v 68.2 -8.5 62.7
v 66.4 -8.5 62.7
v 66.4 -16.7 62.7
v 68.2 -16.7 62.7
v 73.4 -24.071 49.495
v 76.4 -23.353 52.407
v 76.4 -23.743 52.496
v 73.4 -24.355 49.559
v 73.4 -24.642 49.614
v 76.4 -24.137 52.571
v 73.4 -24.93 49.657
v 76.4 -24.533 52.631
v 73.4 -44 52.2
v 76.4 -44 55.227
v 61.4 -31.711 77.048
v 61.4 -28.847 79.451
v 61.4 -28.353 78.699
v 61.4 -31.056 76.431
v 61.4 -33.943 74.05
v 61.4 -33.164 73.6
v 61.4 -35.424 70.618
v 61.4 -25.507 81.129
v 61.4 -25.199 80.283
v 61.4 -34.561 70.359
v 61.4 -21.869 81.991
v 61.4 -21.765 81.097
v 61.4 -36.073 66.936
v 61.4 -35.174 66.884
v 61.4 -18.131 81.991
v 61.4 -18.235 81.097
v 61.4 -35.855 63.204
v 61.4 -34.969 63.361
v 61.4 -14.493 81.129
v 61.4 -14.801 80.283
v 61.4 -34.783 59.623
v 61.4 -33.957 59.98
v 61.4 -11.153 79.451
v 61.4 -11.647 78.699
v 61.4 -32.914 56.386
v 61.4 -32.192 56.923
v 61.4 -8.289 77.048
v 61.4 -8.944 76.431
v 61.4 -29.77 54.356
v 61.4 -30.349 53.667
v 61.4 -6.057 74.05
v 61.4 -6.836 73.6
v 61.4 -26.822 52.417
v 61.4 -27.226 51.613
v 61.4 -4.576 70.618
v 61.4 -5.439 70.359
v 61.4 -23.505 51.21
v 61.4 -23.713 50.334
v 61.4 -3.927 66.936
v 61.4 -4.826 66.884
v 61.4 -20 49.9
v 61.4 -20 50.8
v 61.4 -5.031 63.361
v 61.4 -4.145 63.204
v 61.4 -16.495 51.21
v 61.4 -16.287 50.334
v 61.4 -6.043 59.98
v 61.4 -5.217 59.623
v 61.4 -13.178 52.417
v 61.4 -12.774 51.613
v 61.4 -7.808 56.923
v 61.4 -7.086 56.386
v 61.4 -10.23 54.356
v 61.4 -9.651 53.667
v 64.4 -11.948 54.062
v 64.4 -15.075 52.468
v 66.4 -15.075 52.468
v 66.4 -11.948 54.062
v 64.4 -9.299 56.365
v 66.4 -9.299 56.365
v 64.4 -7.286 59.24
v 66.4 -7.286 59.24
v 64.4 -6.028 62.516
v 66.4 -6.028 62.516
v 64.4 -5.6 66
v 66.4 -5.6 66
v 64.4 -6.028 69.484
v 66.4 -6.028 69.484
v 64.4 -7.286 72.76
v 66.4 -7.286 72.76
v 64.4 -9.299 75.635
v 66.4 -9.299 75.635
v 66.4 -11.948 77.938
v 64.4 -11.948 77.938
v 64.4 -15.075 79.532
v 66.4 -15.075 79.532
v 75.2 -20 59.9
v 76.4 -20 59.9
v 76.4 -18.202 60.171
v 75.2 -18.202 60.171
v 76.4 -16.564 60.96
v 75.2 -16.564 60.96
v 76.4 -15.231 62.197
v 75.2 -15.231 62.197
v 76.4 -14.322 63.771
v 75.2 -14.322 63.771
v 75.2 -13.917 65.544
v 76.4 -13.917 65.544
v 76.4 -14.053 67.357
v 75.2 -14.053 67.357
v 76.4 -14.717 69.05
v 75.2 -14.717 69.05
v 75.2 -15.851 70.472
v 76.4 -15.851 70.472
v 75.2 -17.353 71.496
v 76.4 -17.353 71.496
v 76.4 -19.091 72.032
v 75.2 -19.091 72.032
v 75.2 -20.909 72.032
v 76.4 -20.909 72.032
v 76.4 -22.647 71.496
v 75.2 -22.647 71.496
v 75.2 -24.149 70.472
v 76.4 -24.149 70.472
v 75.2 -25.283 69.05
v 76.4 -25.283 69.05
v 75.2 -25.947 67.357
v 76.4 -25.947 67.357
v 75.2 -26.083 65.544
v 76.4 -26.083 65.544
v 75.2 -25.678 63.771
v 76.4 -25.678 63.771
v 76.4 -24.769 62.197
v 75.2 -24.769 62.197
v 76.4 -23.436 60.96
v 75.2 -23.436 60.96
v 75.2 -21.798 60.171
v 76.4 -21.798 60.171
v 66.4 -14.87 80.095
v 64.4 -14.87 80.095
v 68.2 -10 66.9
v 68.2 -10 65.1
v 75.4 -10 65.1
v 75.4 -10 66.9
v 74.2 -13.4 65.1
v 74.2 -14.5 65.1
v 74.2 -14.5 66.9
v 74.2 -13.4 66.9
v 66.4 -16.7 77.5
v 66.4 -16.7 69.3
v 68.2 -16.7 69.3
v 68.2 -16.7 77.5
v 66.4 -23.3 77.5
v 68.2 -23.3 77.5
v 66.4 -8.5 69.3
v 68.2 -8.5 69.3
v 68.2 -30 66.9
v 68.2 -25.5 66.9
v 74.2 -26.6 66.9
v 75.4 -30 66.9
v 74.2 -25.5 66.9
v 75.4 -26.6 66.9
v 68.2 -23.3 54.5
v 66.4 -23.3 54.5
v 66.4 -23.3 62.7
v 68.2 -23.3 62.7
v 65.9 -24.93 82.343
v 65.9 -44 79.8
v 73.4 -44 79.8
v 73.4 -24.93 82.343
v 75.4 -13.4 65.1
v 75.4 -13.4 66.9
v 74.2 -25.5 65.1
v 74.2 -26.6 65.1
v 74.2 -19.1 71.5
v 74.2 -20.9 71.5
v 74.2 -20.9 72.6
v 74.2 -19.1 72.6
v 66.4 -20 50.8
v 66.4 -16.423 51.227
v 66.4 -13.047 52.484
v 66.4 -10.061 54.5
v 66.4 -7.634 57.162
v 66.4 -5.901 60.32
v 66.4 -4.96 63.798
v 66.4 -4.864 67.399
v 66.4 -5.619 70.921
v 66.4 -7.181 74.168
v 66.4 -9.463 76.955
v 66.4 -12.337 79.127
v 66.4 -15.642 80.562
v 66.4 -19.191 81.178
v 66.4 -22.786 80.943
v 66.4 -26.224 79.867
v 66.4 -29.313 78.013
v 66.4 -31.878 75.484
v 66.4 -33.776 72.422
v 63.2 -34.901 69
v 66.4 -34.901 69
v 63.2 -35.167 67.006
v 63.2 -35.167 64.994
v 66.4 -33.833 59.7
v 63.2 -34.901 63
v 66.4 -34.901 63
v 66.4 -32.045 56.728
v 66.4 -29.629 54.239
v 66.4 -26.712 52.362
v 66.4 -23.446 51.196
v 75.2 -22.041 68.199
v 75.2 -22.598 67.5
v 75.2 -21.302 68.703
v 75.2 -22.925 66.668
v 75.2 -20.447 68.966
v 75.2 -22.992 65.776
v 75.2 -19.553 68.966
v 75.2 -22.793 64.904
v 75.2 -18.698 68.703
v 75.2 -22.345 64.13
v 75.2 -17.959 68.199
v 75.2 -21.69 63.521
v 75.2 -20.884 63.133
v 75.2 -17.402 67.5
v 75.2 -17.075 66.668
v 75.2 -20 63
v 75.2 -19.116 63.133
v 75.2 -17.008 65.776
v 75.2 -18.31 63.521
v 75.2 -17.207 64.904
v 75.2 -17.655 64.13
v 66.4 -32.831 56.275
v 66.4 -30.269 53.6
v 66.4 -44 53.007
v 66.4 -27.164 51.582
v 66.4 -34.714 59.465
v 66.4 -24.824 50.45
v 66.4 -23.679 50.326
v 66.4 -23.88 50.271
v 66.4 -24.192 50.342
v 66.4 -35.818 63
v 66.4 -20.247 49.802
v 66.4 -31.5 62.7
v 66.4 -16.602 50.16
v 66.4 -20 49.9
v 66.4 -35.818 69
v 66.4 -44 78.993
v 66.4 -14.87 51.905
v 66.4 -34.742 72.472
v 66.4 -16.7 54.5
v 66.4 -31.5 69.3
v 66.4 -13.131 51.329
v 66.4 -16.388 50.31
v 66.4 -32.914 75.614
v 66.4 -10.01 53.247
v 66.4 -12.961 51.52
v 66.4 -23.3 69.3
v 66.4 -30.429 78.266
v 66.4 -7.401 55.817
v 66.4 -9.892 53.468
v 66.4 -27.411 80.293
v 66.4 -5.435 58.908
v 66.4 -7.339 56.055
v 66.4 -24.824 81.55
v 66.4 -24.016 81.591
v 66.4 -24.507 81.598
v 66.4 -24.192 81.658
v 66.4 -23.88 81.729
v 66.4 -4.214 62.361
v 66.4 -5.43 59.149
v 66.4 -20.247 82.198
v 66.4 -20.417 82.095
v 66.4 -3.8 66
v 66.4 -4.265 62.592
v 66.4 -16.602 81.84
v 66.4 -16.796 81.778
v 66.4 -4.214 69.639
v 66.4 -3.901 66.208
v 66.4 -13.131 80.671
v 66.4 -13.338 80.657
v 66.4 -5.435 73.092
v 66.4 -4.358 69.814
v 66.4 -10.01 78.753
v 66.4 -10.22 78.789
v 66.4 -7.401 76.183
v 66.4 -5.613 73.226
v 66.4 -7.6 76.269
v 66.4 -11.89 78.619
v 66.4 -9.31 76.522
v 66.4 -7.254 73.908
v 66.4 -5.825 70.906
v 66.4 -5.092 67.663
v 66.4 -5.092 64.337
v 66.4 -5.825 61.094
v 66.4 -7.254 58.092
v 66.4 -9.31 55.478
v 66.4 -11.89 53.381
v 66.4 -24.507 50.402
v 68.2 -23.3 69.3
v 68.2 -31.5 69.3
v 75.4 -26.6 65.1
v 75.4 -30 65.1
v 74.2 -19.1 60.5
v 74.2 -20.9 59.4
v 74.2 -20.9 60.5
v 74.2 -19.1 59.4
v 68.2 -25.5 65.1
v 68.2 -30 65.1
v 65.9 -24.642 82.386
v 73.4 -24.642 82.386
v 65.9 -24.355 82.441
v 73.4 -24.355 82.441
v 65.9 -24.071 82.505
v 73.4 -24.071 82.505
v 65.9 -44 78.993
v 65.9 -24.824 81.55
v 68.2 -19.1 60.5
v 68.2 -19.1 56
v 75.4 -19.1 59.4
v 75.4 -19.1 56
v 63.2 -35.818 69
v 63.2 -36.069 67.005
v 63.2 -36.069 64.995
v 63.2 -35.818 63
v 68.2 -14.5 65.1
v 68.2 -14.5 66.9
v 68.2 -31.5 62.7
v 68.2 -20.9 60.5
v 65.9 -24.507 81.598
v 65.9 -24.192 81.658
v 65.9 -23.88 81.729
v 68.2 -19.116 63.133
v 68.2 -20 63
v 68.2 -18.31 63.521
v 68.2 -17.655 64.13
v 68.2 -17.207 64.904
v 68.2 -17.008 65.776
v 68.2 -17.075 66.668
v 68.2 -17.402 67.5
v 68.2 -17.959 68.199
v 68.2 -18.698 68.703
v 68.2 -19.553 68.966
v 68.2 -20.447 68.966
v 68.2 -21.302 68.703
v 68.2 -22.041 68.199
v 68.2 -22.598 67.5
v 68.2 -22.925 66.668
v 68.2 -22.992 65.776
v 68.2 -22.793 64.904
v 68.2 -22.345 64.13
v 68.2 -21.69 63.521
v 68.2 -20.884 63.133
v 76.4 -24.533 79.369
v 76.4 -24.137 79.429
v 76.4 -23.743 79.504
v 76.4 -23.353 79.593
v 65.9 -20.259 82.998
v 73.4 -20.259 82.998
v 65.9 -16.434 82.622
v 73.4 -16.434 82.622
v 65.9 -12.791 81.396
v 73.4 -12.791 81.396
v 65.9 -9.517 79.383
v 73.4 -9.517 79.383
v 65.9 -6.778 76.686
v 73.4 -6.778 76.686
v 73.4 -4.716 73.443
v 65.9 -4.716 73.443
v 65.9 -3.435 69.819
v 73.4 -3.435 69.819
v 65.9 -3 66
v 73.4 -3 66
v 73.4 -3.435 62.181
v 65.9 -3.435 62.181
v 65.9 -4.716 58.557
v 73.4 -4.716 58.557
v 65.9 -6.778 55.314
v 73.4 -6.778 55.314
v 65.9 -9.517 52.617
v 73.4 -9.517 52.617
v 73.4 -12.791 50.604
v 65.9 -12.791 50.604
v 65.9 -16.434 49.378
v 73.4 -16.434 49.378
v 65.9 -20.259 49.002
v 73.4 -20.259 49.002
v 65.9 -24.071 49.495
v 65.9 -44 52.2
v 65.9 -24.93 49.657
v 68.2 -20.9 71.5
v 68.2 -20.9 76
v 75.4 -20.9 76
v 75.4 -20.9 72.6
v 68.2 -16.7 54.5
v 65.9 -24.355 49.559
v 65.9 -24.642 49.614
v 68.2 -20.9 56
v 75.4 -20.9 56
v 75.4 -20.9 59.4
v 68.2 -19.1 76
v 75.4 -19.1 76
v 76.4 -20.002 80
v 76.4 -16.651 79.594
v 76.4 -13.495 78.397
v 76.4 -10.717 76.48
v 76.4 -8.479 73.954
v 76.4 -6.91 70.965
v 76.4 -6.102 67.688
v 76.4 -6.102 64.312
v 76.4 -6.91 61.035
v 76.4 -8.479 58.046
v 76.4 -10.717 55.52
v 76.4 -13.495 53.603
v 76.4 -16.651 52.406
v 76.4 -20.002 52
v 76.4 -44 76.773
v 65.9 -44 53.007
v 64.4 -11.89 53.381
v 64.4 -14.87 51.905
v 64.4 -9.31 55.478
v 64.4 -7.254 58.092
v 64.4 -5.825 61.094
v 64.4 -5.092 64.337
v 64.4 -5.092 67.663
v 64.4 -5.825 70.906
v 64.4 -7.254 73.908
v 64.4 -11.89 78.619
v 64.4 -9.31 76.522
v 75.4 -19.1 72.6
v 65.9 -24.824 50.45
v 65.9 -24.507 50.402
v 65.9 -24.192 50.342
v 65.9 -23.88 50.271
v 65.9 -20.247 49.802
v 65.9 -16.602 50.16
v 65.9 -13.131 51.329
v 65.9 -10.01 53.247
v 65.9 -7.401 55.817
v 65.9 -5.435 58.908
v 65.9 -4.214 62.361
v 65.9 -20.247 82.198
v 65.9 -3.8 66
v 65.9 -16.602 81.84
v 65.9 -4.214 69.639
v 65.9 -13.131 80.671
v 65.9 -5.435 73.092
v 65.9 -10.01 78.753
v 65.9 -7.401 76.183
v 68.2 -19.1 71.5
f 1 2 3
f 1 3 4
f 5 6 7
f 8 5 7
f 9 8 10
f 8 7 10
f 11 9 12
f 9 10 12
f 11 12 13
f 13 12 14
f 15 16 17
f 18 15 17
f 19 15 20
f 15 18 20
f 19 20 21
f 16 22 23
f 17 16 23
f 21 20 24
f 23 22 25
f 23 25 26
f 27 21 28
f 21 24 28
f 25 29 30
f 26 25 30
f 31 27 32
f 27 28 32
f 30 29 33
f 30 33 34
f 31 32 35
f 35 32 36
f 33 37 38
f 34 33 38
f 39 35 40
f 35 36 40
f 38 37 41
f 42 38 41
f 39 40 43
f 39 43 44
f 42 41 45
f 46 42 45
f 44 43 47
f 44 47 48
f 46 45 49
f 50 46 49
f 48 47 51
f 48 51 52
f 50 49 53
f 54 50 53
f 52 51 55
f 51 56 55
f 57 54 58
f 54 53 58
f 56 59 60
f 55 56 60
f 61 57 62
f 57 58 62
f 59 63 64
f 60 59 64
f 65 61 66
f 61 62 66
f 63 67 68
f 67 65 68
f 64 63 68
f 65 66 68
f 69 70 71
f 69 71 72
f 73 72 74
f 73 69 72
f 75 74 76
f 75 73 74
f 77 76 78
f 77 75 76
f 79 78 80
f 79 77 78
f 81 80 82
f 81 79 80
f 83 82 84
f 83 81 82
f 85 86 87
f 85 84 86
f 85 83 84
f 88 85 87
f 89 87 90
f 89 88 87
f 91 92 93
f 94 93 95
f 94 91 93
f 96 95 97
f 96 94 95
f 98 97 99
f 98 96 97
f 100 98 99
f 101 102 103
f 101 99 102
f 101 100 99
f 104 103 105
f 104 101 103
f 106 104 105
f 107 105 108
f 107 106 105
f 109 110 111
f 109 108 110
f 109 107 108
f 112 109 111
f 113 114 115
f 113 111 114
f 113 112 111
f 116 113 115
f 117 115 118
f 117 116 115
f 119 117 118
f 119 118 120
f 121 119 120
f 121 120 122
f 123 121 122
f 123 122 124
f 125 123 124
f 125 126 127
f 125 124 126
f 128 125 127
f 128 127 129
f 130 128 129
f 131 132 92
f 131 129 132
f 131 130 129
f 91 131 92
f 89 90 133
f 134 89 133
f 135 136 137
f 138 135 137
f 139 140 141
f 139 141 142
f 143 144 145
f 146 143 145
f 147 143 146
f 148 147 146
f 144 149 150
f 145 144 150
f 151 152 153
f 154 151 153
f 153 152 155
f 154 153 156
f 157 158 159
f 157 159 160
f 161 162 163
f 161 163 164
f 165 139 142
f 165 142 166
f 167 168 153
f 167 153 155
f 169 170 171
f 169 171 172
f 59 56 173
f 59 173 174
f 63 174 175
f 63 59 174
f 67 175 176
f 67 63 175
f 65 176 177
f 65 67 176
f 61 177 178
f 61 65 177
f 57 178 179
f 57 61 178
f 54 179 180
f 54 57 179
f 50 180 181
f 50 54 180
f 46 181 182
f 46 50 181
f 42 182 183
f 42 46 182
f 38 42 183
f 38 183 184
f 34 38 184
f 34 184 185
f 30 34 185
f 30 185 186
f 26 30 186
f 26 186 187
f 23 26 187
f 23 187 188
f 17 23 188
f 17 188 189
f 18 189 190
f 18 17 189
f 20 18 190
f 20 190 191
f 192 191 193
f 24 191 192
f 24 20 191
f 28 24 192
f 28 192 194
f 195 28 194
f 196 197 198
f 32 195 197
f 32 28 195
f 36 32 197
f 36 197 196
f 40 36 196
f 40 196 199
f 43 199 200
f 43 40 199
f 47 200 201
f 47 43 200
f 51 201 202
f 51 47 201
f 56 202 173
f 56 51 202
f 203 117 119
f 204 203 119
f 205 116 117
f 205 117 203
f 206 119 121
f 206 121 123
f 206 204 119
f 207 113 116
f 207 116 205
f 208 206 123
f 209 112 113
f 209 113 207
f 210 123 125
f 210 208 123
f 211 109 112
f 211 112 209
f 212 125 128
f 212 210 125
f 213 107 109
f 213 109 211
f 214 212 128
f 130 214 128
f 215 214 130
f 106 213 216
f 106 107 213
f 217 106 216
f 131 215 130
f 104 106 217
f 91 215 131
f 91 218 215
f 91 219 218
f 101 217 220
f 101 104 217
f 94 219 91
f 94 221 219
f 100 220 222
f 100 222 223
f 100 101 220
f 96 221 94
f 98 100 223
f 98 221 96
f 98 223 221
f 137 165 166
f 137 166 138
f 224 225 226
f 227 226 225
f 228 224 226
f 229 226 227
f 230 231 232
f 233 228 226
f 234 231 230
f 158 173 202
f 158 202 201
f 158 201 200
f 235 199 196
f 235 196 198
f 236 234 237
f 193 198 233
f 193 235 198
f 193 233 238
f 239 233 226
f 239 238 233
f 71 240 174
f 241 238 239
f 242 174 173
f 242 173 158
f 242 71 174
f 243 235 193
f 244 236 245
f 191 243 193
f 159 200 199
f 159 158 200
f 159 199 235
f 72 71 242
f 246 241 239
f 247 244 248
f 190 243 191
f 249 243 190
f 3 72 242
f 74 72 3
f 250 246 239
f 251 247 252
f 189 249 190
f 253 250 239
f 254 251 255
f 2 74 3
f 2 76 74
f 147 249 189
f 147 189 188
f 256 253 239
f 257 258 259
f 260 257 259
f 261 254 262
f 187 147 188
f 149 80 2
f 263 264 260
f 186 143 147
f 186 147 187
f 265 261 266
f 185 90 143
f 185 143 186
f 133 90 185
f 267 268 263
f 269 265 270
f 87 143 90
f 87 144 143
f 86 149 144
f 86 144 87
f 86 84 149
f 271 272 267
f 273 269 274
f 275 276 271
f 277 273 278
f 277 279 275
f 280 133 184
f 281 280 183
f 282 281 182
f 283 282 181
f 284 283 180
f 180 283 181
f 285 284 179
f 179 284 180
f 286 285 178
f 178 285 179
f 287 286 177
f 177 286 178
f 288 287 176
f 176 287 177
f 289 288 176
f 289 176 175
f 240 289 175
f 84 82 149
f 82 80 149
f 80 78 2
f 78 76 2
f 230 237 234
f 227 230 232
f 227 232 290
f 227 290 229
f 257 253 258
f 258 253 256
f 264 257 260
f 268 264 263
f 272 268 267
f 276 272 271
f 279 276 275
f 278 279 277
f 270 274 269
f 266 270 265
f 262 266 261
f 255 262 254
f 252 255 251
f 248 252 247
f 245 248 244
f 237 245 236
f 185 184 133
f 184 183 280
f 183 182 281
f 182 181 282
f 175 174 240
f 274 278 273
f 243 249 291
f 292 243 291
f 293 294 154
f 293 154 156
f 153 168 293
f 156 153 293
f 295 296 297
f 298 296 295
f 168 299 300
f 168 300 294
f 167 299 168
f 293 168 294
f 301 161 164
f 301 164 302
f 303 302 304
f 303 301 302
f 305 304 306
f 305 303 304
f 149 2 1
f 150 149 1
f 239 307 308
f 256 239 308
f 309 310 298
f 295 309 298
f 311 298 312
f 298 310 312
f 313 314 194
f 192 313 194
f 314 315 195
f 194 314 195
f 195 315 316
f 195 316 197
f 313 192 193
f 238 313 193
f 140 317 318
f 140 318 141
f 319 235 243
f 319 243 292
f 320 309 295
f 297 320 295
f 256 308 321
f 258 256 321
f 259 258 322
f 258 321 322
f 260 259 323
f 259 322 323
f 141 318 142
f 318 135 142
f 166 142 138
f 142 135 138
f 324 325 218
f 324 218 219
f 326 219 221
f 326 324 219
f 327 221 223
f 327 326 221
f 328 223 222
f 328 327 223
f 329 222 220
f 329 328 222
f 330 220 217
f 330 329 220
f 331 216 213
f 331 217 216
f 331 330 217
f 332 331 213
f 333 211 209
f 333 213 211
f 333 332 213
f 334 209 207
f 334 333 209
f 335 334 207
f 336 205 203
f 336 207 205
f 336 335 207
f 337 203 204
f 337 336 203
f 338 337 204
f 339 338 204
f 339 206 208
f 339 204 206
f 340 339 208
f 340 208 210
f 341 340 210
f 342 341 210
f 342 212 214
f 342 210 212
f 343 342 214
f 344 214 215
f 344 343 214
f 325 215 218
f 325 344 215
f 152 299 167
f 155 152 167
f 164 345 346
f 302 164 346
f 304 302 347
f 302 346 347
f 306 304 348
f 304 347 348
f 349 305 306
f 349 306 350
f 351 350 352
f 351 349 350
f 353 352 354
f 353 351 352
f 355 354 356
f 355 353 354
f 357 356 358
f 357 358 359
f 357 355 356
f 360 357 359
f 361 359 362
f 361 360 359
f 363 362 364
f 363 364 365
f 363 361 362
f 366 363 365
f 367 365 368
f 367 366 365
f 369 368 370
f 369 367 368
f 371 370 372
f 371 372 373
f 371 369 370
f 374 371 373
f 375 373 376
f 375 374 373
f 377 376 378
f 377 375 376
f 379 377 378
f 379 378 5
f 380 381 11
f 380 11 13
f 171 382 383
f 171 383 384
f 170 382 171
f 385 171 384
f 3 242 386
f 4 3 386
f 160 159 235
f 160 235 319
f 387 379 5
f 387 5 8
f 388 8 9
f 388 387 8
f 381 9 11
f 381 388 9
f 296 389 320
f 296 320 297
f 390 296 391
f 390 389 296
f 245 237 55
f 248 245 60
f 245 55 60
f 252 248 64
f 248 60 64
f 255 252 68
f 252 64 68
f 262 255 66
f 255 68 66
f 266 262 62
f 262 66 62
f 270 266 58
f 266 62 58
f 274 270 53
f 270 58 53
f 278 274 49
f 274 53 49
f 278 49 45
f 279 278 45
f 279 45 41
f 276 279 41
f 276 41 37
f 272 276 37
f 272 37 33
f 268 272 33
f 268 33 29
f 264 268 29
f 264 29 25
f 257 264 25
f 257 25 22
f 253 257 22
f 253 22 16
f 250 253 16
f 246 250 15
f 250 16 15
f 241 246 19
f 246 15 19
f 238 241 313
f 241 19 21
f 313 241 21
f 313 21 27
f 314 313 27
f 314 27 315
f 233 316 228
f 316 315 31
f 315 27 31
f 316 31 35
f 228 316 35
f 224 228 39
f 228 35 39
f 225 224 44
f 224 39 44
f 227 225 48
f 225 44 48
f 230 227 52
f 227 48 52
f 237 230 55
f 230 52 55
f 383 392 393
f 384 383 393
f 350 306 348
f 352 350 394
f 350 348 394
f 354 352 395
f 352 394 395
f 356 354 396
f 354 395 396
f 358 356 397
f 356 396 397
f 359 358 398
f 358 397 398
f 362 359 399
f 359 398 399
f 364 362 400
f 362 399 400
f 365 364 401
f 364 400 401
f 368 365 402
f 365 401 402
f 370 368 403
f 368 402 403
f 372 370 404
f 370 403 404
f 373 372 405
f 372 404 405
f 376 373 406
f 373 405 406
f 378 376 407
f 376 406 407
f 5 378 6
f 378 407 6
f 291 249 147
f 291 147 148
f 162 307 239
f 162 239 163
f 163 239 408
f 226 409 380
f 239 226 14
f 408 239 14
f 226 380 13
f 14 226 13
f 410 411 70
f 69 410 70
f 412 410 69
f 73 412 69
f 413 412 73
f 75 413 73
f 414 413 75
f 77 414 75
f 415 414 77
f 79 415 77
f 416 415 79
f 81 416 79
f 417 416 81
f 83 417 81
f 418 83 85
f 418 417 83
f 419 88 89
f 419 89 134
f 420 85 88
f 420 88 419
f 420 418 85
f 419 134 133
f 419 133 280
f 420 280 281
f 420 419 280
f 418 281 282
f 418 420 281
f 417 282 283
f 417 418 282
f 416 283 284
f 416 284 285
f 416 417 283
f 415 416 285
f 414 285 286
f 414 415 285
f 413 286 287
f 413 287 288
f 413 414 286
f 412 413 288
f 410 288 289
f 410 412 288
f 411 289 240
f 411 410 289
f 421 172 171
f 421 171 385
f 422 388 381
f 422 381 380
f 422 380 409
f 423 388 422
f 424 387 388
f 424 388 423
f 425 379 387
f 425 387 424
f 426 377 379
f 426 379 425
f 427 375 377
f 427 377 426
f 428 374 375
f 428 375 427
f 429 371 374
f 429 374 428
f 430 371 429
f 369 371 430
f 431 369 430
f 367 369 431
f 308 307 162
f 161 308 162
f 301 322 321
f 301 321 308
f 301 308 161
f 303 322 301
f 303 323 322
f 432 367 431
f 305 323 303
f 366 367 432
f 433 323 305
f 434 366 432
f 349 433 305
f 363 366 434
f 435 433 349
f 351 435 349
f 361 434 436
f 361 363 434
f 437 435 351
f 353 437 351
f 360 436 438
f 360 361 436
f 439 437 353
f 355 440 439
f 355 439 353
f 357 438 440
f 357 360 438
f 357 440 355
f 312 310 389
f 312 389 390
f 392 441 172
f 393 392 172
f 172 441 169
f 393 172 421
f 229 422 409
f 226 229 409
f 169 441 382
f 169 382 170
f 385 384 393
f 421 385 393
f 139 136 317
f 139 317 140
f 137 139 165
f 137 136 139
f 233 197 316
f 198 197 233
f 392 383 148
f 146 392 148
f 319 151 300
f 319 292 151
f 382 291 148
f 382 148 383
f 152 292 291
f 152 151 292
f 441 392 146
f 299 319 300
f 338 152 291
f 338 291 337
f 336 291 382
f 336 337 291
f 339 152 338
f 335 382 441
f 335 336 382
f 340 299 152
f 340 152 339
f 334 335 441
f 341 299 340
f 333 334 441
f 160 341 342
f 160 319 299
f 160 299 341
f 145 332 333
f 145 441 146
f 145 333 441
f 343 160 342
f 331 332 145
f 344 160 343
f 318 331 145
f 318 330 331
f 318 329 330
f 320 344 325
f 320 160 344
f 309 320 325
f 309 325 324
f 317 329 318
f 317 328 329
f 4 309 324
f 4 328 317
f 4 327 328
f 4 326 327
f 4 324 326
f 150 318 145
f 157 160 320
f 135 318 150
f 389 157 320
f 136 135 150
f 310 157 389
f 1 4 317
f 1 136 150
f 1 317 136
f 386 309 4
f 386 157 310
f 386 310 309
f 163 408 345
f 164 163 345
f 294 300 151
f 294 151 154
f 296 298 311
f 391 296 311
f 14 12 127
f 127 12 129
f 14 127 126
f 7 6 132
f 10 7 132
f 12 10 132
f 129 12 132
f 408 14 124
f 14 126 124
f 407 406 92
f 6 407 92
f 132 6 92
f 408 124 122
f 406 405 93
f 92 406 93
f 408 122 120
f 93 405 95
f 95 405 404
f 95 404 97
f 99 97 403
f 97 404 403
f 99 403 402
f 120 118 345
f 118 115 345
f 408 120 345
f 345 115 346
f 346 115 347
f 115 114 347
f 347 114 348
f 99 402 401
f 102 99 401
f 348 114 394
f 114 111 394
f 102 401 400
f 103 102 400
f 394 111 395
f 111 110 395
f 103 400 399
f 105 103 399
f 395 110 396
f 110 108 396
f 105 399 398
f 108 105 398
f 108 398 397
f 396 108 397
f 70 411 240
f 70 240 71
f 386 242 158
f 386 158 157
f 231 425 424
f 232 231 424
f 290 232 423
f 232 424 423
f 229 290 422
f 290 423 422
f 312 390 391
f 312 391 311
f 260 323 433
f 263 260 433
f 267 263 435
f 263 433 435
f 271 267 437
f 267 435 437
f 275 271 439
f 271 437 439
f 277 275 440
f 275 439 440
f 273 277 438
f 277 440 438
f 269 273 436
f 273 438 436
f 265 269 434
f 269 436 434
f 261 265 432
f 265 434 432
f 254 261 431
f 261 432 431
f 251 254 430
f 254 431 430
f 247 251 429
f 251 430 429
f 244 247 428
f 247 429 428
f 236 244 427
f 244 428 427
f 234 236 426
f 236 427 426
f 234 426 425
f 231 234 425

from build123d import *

# Parameters (mm, degrees)
BOSS_EXTRUDE1_START  = 65.9
BOSS_EXTRUDE1_DEPTH  = 10.5
BOSS_EXTRUDE2_START  = 65.8
BOSS_EXTRUDE2_DEPTH  = 0.6
CHAMFER1_SIZE        = 3
CHAMFER2_SIZE        = 3
BOSS_EXTRUDE3_START  = 62.7
SKETCH3_W            = 2.3
SKETCH3_H            = 23
BOSS_EXTRUDE3_DEPTH  = 6.6
BOSS_EXTRUDE4_START  = 54.5
SKETCH4_W            = 2.3
SKETCH4_H            = 6.6
BOSS_EXTRUDE4_DEPTH  = 23
BOSS_EXTRUDE5_START  = 65.9
SKETCH5_R            = 4.6
BOSS_EXTRUDE5_DEPTH  = 2.3
BOSS_EXTRUDE6_START  = 75.2
SKETCH6_R            = 6.1
BOSS_EXTRUDE6_DEPTH  = 1.7
BOSS_EXTRUDE7_START  = 68.1
SKETCH7_R            = 3
BOSS_EXTRUDE7_DEPTH  = 7.2
BOSS_EXTRUDE8_START  = 65.1
SKETCH8_W            = 6.1
SKETCH8_H            = 1.1
BOSS_EXTRUDE8_DEPTH  = 1.8
BOSS_EXTRUDE9_START  = 71.5
SKETCH9_W            = 6.1
SKETCH9_H            = 1.8
BOSS_EXTRUDE9_DEPTH  = 1.1
BOSS_EXTRUDE10_START = 65.1
SKETCH10_W           = 6.1
SKETCH10_H           = 1.1
BOSS_EXTRUDE10_DEPTH = 1.8
BOSS_EXTRUDE11_START = 59.4
SKETCH11_W           = 6.1
SKETCH11_H           = 1.8
BOSS_EXTRUDE11_DEPTH = 1.1
BOSS_EXTRUDE12_START = 65.1
SKETCH12_W           = 7.3
SKETCH12_H           = 3.4
BOSS_EXTRUDE12_DEPTH = 1.8
BOSS_EXTRUDE13_START = 72.6
SKETCH13_W           = 7.3
SKETCH13_H           = 1.8
BOSS_EXTRUDE13_DEPTH = 3.4
BOSS_EXTRUDE14_START = 65.1
SKETCH14_W           = 7.3
SKETCH14_H           = 3.4
BOSS_EXTRUDE14_DEPTH = 1.8
BOSS_EXTRUDE15_START = 56
SKETCH15_W           = 7.3
SKETCH15_H           = 1.8
BOSS_EXTRUDE15_DEPTH = 3.4
BOSS_EXTRUDE16_START = 64.4
BOSS_EXTRUDE16_DEPTH = 2.05
BOSS_EXTRUDE17_START = 61.4
SKETCH17_R           = 16.1
SKETCH17_R_2         = 15.2
BOSS_EXTRUDE17_DEPTH = 5.05
BOSS_EXTRUDE18_START = 63
SKETCH18_W           = 3.2
SKETCH18_H           = 4
BOSS_EXTRUDE18_DEPTH = 6
BOSS_EXTRUDE19_START = 26
SKETCH19_W           = 20
SKETCH19_H           = 56
BOSS_EXTRUDE19_DEPTH = 80


with BuildPart() as part:
    # Sketch1 → Boss-Extrude1 (new body)
    with BuildSketch(Plane(origin=(0, 0, 0), x_dir=(0, 0, -1), z_dir=(1, 0, 0)).offset(BOSS_EXTRUDE1_START)):
        with BuildLine():
            Line((-49.657293521, -24.929701405), (-54.04649339, -57.848700423))
            ThreePointArc((-54.04649339, -57.848700423), (-53.234221048, -59.119126346), (-52.95, -60.6))
            Line((-52.95, -60.6), (-52.95, -69.4))
            ThreePointArc((-52.95, -69.4), (-54.121572875, -72.228427125), (-56.95, -73.4))
            Line((-56.95, -73.4), (-85.85, -73.4))
            ThreePointArc((-85.85, -73.4), (-88.678427125, -72.228427125), (-89.85, -69.4))
            Line((-89.85, -69.4), (-89.85, -60.6))
            ThreePointArc((-89.85, -60.6), (-88.678427125, -57.771572875), (-85.85, -56.6))
            Line((-85.85, -56.6), (-78.12, -56.6))
            Line((-78.12, -56.6), (-82.342706479, -24.929701405))
            ThreePointArc((-82.342706479, -24.929701405), (-82.412282932, -24.49821266), (-82.505320186, -24.071167593))
            ThreePointArc((-82.505320186, -24.071167593), (-66, -3), (-49.494679814, -24.071167593))
            ThreePointArc((-49.494679814, -24.071167593), (-49.587717068, -24.49821266), (-49.657293521, -24.929701405))
        make_face()
    extrude(amount=BOSS_EXTRUDE1_DEPTH)


with BuildPart() as body_2:
    # Sketch2 → Boss-Extrude2 (new body)
    with BuildSketch(Plane(origin=(0, 0, 0), x_dir=(0, 0, -1), z_dir=(1, 0, 0)).offset(BOSS_EXTRUDE2_START)):
        with BuildLine():
            Line((-50.450275841, -24.823970429), (-54.893518409, -58.148289686))
            ThreePointArc((-54.893518409, -58.148289686), (-54.049936113, -59.247362039), (-53.75, -60.6))
            Line((-53.75, -60.6), (-53.75, -69.4))
            ThreePointArc((-53.75, -69.4), (-54.6872583, -71.6627417), (-56.95, -72.6))
            Line((-56.95, -72.6), (-85.85, -72.6))
            ThreePointArc((-85.85, -72.6), (-88.1127417, -71.6627417), (-89.05, -69.4))
            Line((-89.05, -69.4), (-89.05, -60.6))
            ThreePointArc((-89.05, -60.6), (-88.1127417, -58.3372583), (-85.85, -57.4))
            Line((-85.85, -57.4), (-77.206253549, -57.4))
            Line((-77.206253549, -57.4), (-81.549724159, -24.823970429))
            ThreePointArc((-81.549724159, -24.823970429), (-81.626258257, -24.34933281), (-81.728599236, -23.879583236))
            ThreePointArc((-81.728599236, -23.879583236), (-66, -3.8), (-50.271400764, -23.879583236))
            ThreePointArc((-50.271400764, -23.879583236), (-50.373741743, -24.34933281), (-50.450275841, -24.823970429))
        make_face()
    extrude(amount=BOSS_EXTRUDE2_DEPTH)


with BuildPart() as part_1:
    add(part.part)

    # Combine1: cut body 2
    add(body_2.part, mode=Mode.SUBTRACT)

    # Chamfer1
    chamfer1_edges = [part_1.edges().sort_by_distance(p)[0] for p in [
        (76.4, -41.389200914, 51.851893455),
        (76.4, -24.49821266, 49.587717068),
        (76.4, -24.49821266, 82.412282932),
        (76.4, -3, 66),
        (76.4, -40.764850703, 80.23135324),
    ]]
    chamfer(chamfer1_edges, length=CHAMFER1_SIZE)

    # Chamfer2
    chamfer2_edges = [part_1.edges().sort_by_distance(p)[0] for p in [
        (76.4, -56.6, 80.471725405),
        (76.4, -57.771572875, 88.678427125),
        (76.4, -57.786965833, 54.106263237),
        (76.4, -65, 89.85),
        (76.4, -65, 52.95),
        (76.4, -72.228427125, 88.678427125),
        (76.4, -72.228427125, 54.121572875),
        (76.4, -73.4, 71.4),
    ]]
    chamfer(chamfer2_edges, length=CHAMFER2_SIZE)


with BuildPart() as body_2_2:
    # Sketch3 → Boss-Extrude3 (new body)
    with BuildSketch(Plane.XY.offset(BOSS_EXTRUDE3_START)):
        with Locations((67.05, -20)):
            Rectangle(SKETCH3_W, SKETCH3_H)
    extrude(amount=BOSS_EXTRUDE3_DEPTH)


with BuildPart() as part_2:
    add(part_1.part)

    # Combine2: cut body 2 2
    add(body_2_2.part, mode=Mode.SUBTRACT)


with BuildPart() as body_2_3:
    # Sketch4 → Boss-Extrude4 (new body)
    with BuildSketch(Plane.XY.offset(BOSS_EXTRUDE4_START)):
        with Locations((67.05, -20)):
            Rectangle(SKETCH4_W, SKETCH4_H)
    extrude(amount=BOSS_EXTRUDE4_DEPTH)


with BuildPart() as part_3:
    add(part_2.part)

    # Combine3: cut body 2 3
    add(body_2_3.part, mode=Mode.SUBTRACT)


with BuildPart() as body_2_4:
    # Sketch5 → Boss-Extrude5 (new body)
    with BuildSketch(Plane(origin=(0, 0, 0), x_dir=(0, 0, -1), z_dir=(1, 0, 0)).offset(BOSS_EXTRUDE5_START)):
        with Locations((-66, -20)):
            Circle(SKETCH5_R)
    extrude(amount=BOSS_EXTRUDE5_DEPTH)


with BuildPart() as part_4:
    add(part_3.part)

    # Combine4: cut body 2 4
    add(body_2_4.part, mode=Mode.SUBTRACT)


with BuildPart() as body_2_5:
    # Sketch6 → Boss-Extrude6 (new body)
    with BuildSketch(Plane(origin=(0, 0, 0), x_dir=(0, 0, -1), z_dir=(1, 0, 0)).offset(BOSS_EXTRUDE6_START)):
        with Locations((-66, -20)):
            Circle(SKETCH6_R)
    extrude(amount=BOSS_EXTRUDE6_DEPTH)


with BuildPart() as part_5:
    add(part_4.part)

    # Combine5: cut body 2 5
    add(body_2_5.part, mode=Mode.SUBTRACT)


with BuildPart() as body_2_6:
    # Sketch7 → Boss-Extrude7 (new body)
    with BuildSketch(Plane(origin=(0, 0, 0), x_dir=(0, 0, -1), z_dir=(1, 0, 0)).offset(BOSS_EXTRUDE7_START)):
        with Locations((-66, -20)):
            Circle(SKETCH7_R)
    extrude(amount=BOSS_EXTRUDE7_DEPTH)


with BuildPart() as part_6:
    add(part_5.part)

    # Combine6: cut body 2 6
    add(body_2_6.part, mode=Mode.SUBTRACT)


with BuildPart() as body_2_7:
    # Sketch8 → Boss-Extrude8 (new body)
    with BuildSketch(Plane.XY.offset(BOSS_EXTRUDE8_START)):
        with Locations((71.15, -13.95)):
            Rectangle(SKETCH8_W, SKETCH8_H)
    extrude(amount=BOSS_EXTRUDE8_DEPTH)


with BuildPart() as part_7:
    add(part_6.part)

    # Combine7: cut body 2 7
    add(body_2_7.part, mode=Mode.SUBTRACT)


with BuildPart() as body_2_8:
    # Sketch9 → Boss-Extrude9 (new body)
    with BuildSketch(Plane.XY.offset(BOSS_EXTRUDE9_START)):
        with Locations((71.15, -20)):
            Rectangle(SKETCH9_W, SKETCH9_H)
    extrude(amount=BOSS_EXTRUDE9_DEPTH)


with BuildPart() as part_8:
    add(part_7.part)

    # Combine8: cut body 2 8
    add(body_2_8.part, mode=Mode.SUBTRACT)


with BuildPart() as body_2_9:
    # Sketch10 → Boss-Extrude10 (new body)
    with BuildSketch(Plane.XY.offset(BOSS_EXTRUDE10_START)):
        with Locations((71.15, -26.05)):
            Rectangle(SKETCH10_W, SKETCH10_H)
    extrude(amount=BOSS_EXTRUDE10_DEPTH)


with BuildPart() as part_9:
    add(part_8.part)

    # Combine9: cut body 2 9
    add(body_2_9.part, mode=Mode.SUBTRACT)


with BuildPart() as body_2_10:
    # Sketch11 → Boss-Extrude11 (new body)
    with BuildSketch(Plane.XY.offset(BOSS_EXTRUDE11_START)):
        with Locations((71.15, -20)):
            Rectangle(SKETCH11_W, SKETCH11_H)
    extrude(amount=BOSS_EXTRUDE11_DEPTH)


with BuildPart() as part_10:
    add(part_9.part)

    # Combine10: cut body 2 10
    add(body_2_10.part, mode=Mode.SUBTRACT)


with BuildPart() as body_2_11:
    # Sketch12 → Boss-Extrude12 (new body)
    with BuildSketch(Plane.XY.offset(BOSS_EXTRUDE12_START)):
        with Locations((71.75, -11.7)):
            Rectangle(SKETCH12_W, SKETCH12_H)
    extrude(amount=BOSS_EXTRUDE12_DEPTH)


with BuildPart() as part_11:
    add(part_10.part)

    # Combine11: cut body 2 11
    add(body_2_11.part, mode=Mode.SUBTRACT)


with BuildPart() as body_2_12:
    # Sketch13 → Boss-Extrude13 (new body)
    with BuildSketch(Plane.XY.offset(BOSS_EXTRUDE13_START)):
        with Locations((71.75, -20)):
            Rectangle(SKETCH13_W, SKETCH13_H)
    extrude(amount=BOSS_EXTRUDE13_DEPTH)


with BuildPart() as part_12:
    add(part_11.part)

    # Combine12: cut body 2 12
    add(body_2_12.part, mode=Mode.SUBTRACT)


with BuildPart() as body_2_13:
    # Sketch14 → Boss-Extrude14 (new body)
    with BuildSketch(Plane.XY.offset(BOSS_EXTRUDE14_START)):
        with Locations((71.75, -28.3)):
            Rectangle(SKETCH14_W, SKETCH14_H)
    extrude(amount=BOSS_EXTRUDE14_DEPTH)


with BuildPart() as part_13:
    add(part_12.part)

    # Combine13: cut body 2 13
    add(body_2_13.part, mode=Mode.SUBTRACT)


with BuildPart() as body_2_14:
    # Sketch15 → Boss-Extrude15 (new body)
    with BuildSketch(Plane.XY.offset(BOSS_EXTRUDE15_START)):
        with Locations((71.75, -20)):
            Rectangle(SKETCH15_W, SKETCH15_H)
    extrude(amount=BOSS_EXTRUDE15_DEPTH)


with BuildPart() as part_14:
    add(part_13.part)

    # Combine14: cut body 2 14
    add(body_2_14.part, mode=Mode.SUBTRACT)

    # Sketch16 → Boss-Extrude16 (add)
    with BuildSketch(Plane(origin=(0, 0, 0), x_dir=(0, 0, -1), z_dir=(1, 0, 0)).offset(BOSS_EXTRUDE16_START)):
        with BuildLine():
            Line((-51.904610688, -14.86969785), (-52.468426261, -15.074909936))
            ThreePointArc((-52.468426261, -15.074909936), (-66, -5.6), (-79.531573739, -15.074909936))
            Line((-79.531573739, -15.074909936), (-80.095389312, -14.86969785))
            ThreePointArc((-80.095389312, -14.86969785), (-66, -5), (-51.904610688, -14.86969785))
        make_face()
    extrude(amount=BOSS_EXTRUDE16_DEPTH)

    # Sketch17 → Boss-Extrude17 (add)
    with BuildSketch(Plane(origin=(0, 0, 0), x_dir=(0, 0, -1), z_dir=(1, 0, 0)).offset(BOSS_EXTRUDE17_START)):
        with Locations((-66, -20)):
            Circle(SKETCH17_R)
        with Locations((-66, -20)):
            Circle(SKETCH17_R_2, mode=Mode.SUBTRACT)
    extrude(amount=BOSS_EXTRUDE17_DEPTH)


with BuildPart() as body_2_15:
    # Sketch18 → Boss-Extrude18 (new body)
    with BuildSketch(Plane.XY.offset(BOSS_EXTRUDE18_START)):
        with Locations((64.8, -36)):
            Rectangle(SKETCH18_W, SKETCH18_H)
    extrude(amount=BOSS_EXTRUDE18_DEPTH)


with BuildPart() as part_15:
    add(part_14.part)

    # Combine15: cut body 2 15
    add(body_2_15.part, mode=Mode.SUBTRACT)


with BuildPart() as body_2_16:
    # Sketch19 → Boss-Extrude19 (new body)
    with BuildSketch(Plane.XY.offset(BOSS_EXTRUDE19_START)):
        with Locations((70, -72)):
            Rectangle(SKETCH19_W, SKETCH19_H)
    extrude(amount=BOSS_EXTRUDE19_DEPTH)


with BuildPart() as part_16:
    add(part_15.part)

    # Combine16: cut body 2 16
    add(body_2_16.part, mode=Mode.SUBTRACT)


solid = part_16.part
